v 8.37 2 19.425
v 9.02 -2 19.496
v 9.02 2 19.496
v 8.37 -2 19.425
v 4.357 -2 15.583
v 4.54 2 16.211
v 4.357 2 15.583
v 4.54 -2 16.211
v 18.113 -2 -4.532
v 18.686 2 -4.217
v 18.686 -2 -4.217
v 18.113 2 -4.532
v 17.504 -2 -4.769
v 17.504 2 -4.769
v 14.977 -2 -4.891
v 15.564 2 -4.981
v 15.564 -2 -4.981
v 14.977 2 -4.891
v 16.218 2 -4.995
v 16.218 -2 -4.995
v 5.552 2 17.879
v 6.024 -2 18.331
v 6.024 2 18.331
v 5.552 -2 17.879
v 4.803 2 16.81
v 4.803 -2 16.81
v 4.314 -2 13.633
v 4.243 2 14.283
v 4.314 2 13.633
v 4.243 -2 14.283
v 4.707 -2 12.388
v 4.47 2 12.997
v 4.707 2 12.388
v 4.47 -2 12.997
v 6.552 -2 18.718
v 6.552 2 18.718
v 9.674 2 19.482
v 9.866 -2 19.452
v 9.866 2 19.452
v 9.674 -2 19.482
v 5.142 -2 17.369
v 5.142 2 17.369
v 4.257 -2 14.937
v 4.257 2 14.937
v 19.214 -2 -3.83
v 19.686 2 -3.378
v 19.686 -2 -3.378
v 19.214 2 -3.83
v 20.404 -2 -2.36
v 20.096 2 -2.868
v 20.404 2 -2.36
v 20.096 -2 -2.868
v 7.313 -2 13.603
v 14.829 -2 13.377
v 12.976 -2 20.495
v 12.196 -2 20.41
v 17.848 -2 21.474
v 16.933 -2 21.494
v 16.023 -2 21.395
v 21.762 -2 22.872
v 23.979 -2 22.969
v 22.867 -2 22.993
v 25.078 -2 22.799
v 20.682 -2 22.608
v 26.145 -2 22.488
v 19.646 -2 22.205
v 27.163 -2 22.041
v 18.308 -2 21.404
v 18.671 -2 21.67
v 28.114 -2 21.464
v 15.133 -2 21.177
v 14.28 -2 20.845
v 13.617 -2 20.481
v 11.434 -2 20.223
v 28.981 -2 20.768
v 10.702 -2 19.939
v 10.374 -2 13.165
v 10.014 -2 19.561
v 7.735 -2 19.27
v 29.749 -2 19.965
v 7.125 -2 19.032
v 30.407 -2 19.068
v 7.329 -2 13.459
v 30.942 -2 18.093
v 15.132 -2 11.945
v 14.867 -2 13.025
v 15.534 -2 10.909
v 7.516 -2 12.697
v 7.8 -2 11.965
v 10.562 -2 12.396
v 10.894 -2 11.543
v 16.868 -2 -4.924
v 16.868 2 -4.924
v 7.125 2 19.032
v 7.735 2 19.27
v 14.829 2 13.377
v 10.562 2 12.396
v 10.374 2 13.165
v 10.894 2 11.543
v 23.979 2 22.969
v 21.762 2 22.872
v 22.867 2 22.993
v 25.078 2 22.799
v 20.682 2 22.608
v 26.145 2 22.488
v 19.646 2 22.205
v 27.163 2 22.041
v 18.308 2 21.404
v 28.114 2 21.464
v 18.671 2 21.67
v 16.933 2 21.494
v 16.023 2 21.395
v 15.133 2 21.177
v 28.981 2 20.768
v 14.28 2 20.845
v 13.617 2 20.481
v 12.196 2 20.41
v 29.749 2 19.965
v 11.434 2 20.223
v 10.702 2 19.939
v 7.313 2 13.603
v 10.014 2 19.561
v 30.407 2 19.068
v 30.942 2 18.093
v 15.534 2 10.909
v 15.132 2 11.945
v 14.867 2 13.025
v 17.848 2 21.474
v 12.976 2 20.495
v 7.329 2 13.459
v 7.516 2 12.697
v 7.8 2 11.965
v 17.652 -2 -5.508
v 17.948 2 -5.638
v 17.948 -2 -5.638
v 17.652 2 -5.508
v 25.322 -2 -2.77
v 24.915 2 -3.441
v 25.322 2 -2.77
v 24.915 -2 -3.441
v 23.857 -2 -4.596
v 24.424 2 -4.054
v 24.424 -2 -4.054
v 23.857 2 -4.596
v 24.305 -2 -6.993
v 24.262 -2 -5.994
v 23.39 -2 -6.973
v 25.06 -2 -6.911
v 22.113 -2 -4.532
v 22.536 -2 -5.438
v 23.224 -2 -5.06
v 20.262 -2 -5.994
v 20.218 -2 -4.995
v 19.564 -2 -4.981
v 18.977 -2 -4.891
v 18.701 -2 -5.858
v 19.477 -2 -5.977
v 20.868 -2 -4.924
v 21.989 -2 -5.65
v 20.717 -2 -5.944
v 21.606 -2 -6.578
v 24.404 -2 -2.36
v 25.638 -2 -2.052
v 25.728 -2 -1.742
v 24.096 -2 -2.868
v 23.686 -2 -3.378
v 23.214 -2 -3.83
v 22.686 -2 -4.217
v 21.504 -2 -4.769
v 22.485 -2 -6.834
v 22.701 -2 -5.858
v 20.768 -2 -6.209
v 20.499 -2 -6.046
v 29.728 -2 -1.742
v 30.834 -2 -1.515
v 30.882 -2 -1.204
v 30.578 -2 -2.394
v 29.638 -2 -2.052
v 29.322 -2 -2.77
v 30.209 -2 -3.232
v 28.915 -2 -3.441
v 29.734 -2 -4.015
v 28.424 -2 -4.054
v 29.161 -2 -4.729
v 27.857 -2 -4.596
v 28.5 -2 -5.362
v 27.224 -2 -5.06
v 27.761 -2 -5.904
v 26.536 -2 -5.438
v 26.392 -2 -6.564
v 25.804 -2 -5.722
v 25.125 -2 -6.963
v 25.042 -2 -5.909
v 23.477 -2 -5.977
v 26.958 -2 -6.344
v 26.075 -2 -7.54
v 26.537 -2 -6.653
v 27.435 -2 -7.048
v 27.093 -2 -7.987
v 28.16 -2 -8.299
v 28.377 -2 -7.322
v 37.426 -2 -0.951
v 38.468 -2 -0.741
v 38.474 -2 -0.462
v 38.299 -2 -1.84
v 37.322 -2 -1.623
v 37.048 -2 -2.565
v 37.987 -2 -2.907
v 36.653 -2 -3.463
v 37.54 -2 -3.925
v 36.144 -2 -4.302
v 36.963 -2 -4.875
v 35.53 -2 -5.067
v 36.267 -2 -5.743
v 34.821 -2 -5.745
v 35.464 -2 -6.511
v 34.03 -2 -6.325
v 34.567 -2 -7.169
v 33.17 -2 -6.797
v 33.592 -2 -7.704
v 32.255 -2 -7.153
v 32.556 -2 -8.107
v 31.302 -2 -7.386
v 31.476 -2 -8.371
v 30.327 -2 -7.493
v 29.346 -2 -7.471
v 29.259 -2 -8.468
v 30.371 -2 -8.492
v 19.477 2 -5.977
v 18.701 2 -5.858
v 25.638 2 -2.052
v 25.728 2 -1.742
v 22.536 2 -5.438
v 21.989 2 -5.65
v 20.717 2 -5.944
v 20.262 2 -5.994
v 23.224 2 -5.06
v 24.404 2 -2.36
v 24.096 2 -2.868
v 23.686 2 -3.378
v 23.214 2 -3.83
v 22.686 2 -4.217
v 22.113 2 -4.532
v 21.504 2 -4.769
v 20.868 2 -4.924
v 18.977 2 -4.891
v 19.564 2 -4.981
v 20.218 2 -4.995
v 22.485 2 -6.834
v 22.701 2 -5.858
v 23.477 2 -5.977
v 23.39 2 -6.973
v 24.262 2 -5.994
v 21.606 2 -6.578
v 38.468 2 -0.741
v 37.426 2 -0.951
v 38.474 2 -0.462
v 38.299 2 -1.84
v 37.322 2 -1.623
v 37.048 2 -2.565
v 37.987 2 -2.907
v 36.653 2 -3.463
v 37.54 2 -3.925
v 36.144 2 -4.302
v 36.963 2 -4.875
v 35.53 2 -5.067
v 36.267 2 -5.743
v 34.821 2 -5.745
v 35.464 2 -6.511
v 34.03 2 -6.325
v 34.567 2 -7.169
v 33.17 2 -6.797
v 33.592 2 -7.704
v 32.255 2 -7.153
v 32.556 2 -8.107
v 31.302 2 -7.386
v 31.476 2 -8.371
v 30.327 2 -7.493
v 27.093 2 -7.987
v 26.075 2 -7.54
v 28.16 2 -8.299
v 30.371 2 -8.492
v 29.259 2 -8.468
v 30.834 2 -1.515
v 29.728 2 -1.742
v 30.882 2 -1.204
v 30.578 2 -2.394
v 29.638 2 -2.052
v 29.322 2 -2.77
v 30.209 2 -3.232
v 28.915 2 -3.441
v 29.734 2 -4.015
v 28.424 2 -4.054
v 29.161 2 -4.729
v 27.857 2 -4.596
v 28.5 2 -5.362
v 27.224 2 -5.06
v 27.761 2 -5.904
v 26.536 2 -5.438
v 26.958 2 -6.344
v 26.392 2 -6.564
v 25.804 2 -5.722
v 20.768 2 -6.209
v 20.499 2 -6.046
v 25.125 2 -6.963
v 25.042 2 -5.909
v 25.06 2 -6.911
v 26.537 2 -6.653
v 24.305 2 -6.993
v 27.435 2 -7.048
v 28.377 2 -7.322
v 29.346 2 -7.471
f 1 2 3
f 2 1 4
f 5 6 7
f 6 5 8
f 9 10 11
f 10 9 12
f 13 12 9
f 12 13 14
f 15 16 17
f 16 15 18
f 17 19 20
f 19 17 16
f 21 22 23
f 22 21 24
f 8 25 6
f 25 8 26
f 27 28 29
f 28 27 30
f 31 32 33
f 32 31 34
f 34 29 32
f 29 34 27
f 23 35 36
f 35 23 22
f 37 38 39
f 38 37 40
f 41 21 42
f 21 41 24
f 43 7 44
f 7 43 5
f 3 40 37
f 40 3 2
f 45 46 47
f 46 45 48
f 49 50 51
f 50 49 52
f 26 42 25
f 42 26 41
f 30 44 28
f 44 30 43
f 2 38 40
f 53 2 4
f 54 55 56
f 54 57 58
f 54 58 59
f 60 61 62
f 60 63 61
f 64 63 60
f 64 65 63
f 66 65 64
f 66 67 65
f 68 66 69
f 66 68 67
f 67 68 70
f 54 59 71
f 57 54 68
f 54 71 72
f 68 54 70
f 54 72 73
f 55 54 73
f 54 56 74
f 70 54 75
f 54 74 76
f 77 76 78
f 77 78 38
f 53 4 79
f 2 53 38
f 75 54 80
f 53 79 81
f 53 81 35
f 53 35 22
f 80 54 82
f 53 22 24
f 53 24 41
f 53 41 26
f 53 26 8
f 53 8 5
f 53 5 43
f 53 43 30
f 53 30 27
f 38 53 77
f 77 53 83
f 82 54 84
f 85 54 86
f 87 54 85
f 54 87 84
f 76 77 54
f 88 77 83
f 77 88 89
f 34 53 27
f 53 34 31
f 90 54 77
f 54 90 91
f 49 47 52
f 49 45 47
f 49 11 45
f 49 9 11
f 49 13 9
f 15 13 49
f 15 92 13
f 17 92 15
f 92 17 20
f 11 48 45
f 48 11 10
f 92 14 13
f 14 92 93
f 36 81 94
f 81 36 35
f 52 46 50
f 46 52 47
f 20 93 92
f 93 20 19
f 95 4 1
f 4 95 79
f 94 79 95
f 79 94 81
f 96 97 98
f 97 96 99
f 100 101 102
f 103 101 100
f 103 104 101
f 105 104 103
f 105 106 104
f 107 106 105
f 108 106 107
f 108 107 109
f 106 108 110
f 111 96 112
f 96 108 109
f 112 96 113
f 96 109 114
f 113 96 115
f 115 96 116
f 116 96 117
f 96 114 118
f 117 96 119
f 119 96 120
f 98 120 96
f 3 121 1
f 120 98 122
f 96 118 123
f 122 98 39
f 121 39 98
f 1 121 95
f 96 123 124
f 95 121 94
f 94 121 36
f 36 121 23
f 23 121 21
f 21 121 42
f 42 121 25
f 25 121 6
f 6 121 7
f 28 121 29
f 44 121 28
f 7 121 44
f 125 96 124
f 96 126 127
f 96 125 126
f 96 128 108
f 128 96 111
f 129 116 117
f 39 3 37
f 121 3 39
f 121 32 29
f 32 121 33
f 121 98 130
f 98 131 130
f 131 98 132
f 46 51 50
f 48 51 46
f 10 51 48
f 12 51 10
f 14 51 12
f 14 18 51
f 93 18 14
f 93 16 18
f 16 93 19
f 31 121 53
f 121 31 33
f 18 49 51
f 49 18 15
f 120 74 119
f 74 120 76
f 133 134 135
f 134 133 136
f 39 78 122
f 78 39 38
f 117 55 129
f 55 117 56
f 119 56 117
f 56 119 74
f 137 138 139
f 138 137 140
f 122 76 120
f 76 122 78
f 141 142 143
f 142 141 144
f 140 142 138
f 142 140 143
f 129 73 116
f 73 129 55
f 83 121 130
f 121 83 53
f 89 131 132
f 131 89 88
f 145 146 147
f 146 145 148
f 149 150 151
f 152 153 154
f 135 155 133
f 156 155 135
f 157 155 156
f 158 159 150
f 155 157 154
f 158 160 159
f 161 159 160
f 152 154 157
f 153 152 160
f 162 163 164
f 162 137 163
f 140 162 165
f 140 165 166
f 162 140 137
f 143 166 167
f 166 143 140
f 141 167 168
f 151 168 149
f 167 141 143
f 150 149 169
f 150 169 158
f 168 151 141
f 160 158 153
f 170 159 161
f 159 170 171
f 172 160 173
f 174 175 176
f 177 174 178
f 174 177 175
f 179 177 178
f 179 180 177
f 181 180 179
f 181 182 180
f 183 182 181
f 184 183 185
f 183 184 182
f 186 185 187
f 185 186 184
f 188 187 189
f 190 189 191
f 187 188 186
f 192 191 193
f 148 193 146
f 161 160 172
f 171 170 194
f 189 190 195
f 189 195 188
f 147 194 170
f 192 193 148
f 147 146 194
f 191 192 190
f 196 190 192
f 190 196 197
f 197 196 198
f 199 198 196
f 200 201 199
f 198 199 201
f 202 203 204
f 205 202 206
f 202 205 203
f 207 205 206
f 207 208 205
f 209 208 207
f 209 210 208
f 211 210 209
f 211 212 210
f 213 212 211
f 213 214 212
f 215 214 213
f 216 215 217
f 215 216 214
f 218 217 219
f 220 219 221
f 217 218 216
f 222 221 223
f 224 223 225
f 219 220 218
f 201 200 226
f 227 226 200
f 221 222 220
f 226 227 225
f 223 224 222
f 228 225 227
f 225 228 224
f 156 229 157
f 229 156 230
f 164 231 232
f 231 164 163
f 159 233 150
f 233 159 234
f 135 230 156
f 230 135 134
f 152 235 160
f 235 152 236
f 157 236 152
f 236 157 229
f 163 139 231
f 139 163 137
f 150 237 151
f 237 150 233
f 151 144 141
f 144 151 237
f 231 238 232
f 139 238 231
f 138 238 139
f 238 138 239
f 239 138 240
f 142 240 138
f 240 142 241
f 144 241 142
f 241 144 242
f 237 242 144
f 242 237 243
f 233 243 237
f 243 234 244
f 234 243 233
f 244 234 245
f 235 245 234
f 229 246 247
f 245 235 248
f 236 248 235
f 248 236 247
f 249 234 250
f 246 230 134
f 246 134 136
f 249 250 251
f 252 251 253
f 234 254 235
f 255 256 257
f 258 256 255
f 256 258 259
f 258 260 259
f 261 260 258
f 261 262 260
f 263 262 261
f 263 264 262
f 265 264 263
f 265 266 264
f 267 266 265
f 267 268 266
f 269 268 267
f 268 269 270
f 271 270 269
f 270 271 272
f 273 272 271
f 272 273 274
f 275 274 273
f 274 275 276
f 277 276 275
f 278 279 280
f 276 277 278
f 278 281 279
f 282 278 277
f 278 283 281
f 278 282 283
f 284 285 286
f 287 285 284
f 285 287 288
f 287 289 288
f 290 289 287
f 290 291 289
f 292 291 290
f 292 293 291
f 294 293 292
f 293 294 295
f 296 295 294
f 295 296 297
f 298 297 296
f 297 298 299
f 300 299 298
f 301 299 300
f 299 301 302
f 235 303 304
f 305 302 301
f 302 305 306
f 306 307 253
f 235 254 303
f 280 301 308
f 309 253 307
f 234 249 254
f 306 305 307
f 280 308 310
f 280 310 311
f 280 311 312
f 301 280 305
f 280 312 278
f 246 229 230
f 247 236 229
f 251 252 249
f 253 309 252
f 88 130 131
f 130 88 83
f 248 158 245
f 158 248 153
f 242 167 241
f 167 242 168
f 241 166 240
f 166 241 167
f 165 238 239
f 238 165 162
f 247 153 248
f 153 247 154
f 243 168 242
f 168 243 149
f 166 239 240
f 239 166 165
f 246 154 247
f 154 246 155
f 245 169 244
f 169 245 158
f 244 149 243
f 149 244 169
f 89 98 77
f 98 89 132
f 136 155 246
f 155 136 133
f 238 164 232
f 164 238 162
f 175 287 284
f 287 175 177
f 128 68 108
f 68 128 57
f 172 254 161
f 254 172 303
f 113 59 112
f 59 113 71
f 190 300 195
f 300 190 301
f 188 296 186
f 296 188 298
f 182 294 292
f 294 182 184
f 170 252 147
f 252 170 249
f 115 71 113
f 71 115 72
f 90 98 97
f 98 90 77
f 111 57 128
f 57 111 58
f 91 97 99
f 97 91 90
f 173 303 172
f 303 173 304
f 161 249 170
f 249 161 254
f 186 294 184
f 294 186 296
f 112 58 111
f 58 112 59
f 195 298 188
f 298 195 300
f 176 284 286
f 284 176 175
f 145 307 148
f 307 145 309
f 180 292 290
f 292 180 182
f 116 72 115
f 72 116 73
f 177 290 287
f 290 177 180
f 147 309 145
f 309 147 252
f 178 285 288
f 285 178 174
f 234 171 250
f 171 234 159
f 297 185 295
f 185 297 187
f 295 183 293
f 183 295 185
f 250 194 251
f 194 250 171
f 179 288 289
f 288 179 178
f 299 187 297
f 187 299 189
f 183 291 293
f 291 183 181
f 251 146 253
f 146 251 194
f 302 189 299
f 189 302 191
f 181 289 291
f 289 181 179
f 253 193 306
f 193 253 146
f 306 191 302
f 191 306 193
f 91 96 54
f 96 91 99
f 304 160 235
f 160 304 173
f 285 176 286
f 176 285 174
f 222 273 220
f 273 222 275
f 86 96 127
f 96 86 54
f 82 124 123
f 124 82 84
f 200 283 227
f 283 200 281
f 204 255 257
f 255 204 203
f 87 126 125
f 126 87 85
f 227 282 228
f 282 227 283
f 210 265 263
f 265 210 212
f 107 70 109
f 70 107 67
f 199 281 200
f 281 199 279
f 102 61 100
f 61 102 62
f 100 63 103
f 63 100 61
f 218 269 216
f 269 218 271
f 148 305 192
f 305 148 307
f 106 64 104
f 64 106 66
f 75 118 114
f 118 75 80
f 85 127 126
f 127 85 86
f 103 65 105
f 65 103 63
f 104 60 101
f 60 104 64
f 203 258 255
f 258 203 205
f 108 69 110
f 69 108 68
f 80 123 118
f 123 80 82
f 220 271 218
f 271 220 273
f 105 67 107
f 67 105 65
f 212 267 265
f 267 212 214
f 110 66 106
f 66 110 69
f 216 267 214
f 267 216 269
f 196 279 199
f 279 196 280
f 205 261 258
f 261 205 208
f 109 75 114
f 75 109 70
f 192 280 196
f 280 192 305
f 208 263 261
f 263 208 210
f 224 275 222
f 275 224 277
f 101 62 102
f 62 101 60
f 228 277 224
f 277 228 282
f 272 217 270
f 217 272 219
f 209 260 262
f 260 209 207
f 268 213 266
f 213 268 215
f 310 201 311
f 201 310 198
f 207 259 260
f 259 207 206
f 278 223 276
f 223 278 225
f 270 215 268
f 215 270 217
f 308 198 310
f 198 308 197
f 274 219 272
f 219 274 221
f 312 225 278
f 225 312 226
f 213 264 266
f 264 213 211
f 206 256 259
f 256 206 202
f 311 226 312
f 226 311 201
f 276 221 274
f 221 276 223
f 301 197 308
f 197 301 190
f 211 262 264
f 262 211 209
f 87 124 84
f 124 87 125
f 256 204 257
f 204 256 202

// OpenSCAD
/*
 * razor_dock_test.scad
 * Test four handle diameters in a single dock validation fixture.
 */

razor_dock_angle = 25;
razor_handle_clearance = 1.0;

module dock_for(diameter) {
    translate([diameter * 2.0, 0, 0])
    rotate([0, -razor_dock_angle, 0])
        difference() {
            hull() {
                translate([0, 0, 0])
                    rotate([90,0,0])
                        cylinder(h = 4, r = diameter/2 + razor_handle_clearance, center=true, $fn=48);
                translate([0, 0, 16])
                    rotate([90,0,0])
                        cylinder(h = 4, r = diameter/2 + razor_handle_clearance, center=true, $fn=48);
            }
            translate([0, 0, 0])
                rotate([90,0,0])
                    cylinder(h = 6, r = diameter/2, center=true, $fn=48);
            translate([0,0,6])
                cube([diameter + 5, 5, 20], center=true);
        }
}

for (d = [8,10,12,15]) {
    dock_for(d);
}
